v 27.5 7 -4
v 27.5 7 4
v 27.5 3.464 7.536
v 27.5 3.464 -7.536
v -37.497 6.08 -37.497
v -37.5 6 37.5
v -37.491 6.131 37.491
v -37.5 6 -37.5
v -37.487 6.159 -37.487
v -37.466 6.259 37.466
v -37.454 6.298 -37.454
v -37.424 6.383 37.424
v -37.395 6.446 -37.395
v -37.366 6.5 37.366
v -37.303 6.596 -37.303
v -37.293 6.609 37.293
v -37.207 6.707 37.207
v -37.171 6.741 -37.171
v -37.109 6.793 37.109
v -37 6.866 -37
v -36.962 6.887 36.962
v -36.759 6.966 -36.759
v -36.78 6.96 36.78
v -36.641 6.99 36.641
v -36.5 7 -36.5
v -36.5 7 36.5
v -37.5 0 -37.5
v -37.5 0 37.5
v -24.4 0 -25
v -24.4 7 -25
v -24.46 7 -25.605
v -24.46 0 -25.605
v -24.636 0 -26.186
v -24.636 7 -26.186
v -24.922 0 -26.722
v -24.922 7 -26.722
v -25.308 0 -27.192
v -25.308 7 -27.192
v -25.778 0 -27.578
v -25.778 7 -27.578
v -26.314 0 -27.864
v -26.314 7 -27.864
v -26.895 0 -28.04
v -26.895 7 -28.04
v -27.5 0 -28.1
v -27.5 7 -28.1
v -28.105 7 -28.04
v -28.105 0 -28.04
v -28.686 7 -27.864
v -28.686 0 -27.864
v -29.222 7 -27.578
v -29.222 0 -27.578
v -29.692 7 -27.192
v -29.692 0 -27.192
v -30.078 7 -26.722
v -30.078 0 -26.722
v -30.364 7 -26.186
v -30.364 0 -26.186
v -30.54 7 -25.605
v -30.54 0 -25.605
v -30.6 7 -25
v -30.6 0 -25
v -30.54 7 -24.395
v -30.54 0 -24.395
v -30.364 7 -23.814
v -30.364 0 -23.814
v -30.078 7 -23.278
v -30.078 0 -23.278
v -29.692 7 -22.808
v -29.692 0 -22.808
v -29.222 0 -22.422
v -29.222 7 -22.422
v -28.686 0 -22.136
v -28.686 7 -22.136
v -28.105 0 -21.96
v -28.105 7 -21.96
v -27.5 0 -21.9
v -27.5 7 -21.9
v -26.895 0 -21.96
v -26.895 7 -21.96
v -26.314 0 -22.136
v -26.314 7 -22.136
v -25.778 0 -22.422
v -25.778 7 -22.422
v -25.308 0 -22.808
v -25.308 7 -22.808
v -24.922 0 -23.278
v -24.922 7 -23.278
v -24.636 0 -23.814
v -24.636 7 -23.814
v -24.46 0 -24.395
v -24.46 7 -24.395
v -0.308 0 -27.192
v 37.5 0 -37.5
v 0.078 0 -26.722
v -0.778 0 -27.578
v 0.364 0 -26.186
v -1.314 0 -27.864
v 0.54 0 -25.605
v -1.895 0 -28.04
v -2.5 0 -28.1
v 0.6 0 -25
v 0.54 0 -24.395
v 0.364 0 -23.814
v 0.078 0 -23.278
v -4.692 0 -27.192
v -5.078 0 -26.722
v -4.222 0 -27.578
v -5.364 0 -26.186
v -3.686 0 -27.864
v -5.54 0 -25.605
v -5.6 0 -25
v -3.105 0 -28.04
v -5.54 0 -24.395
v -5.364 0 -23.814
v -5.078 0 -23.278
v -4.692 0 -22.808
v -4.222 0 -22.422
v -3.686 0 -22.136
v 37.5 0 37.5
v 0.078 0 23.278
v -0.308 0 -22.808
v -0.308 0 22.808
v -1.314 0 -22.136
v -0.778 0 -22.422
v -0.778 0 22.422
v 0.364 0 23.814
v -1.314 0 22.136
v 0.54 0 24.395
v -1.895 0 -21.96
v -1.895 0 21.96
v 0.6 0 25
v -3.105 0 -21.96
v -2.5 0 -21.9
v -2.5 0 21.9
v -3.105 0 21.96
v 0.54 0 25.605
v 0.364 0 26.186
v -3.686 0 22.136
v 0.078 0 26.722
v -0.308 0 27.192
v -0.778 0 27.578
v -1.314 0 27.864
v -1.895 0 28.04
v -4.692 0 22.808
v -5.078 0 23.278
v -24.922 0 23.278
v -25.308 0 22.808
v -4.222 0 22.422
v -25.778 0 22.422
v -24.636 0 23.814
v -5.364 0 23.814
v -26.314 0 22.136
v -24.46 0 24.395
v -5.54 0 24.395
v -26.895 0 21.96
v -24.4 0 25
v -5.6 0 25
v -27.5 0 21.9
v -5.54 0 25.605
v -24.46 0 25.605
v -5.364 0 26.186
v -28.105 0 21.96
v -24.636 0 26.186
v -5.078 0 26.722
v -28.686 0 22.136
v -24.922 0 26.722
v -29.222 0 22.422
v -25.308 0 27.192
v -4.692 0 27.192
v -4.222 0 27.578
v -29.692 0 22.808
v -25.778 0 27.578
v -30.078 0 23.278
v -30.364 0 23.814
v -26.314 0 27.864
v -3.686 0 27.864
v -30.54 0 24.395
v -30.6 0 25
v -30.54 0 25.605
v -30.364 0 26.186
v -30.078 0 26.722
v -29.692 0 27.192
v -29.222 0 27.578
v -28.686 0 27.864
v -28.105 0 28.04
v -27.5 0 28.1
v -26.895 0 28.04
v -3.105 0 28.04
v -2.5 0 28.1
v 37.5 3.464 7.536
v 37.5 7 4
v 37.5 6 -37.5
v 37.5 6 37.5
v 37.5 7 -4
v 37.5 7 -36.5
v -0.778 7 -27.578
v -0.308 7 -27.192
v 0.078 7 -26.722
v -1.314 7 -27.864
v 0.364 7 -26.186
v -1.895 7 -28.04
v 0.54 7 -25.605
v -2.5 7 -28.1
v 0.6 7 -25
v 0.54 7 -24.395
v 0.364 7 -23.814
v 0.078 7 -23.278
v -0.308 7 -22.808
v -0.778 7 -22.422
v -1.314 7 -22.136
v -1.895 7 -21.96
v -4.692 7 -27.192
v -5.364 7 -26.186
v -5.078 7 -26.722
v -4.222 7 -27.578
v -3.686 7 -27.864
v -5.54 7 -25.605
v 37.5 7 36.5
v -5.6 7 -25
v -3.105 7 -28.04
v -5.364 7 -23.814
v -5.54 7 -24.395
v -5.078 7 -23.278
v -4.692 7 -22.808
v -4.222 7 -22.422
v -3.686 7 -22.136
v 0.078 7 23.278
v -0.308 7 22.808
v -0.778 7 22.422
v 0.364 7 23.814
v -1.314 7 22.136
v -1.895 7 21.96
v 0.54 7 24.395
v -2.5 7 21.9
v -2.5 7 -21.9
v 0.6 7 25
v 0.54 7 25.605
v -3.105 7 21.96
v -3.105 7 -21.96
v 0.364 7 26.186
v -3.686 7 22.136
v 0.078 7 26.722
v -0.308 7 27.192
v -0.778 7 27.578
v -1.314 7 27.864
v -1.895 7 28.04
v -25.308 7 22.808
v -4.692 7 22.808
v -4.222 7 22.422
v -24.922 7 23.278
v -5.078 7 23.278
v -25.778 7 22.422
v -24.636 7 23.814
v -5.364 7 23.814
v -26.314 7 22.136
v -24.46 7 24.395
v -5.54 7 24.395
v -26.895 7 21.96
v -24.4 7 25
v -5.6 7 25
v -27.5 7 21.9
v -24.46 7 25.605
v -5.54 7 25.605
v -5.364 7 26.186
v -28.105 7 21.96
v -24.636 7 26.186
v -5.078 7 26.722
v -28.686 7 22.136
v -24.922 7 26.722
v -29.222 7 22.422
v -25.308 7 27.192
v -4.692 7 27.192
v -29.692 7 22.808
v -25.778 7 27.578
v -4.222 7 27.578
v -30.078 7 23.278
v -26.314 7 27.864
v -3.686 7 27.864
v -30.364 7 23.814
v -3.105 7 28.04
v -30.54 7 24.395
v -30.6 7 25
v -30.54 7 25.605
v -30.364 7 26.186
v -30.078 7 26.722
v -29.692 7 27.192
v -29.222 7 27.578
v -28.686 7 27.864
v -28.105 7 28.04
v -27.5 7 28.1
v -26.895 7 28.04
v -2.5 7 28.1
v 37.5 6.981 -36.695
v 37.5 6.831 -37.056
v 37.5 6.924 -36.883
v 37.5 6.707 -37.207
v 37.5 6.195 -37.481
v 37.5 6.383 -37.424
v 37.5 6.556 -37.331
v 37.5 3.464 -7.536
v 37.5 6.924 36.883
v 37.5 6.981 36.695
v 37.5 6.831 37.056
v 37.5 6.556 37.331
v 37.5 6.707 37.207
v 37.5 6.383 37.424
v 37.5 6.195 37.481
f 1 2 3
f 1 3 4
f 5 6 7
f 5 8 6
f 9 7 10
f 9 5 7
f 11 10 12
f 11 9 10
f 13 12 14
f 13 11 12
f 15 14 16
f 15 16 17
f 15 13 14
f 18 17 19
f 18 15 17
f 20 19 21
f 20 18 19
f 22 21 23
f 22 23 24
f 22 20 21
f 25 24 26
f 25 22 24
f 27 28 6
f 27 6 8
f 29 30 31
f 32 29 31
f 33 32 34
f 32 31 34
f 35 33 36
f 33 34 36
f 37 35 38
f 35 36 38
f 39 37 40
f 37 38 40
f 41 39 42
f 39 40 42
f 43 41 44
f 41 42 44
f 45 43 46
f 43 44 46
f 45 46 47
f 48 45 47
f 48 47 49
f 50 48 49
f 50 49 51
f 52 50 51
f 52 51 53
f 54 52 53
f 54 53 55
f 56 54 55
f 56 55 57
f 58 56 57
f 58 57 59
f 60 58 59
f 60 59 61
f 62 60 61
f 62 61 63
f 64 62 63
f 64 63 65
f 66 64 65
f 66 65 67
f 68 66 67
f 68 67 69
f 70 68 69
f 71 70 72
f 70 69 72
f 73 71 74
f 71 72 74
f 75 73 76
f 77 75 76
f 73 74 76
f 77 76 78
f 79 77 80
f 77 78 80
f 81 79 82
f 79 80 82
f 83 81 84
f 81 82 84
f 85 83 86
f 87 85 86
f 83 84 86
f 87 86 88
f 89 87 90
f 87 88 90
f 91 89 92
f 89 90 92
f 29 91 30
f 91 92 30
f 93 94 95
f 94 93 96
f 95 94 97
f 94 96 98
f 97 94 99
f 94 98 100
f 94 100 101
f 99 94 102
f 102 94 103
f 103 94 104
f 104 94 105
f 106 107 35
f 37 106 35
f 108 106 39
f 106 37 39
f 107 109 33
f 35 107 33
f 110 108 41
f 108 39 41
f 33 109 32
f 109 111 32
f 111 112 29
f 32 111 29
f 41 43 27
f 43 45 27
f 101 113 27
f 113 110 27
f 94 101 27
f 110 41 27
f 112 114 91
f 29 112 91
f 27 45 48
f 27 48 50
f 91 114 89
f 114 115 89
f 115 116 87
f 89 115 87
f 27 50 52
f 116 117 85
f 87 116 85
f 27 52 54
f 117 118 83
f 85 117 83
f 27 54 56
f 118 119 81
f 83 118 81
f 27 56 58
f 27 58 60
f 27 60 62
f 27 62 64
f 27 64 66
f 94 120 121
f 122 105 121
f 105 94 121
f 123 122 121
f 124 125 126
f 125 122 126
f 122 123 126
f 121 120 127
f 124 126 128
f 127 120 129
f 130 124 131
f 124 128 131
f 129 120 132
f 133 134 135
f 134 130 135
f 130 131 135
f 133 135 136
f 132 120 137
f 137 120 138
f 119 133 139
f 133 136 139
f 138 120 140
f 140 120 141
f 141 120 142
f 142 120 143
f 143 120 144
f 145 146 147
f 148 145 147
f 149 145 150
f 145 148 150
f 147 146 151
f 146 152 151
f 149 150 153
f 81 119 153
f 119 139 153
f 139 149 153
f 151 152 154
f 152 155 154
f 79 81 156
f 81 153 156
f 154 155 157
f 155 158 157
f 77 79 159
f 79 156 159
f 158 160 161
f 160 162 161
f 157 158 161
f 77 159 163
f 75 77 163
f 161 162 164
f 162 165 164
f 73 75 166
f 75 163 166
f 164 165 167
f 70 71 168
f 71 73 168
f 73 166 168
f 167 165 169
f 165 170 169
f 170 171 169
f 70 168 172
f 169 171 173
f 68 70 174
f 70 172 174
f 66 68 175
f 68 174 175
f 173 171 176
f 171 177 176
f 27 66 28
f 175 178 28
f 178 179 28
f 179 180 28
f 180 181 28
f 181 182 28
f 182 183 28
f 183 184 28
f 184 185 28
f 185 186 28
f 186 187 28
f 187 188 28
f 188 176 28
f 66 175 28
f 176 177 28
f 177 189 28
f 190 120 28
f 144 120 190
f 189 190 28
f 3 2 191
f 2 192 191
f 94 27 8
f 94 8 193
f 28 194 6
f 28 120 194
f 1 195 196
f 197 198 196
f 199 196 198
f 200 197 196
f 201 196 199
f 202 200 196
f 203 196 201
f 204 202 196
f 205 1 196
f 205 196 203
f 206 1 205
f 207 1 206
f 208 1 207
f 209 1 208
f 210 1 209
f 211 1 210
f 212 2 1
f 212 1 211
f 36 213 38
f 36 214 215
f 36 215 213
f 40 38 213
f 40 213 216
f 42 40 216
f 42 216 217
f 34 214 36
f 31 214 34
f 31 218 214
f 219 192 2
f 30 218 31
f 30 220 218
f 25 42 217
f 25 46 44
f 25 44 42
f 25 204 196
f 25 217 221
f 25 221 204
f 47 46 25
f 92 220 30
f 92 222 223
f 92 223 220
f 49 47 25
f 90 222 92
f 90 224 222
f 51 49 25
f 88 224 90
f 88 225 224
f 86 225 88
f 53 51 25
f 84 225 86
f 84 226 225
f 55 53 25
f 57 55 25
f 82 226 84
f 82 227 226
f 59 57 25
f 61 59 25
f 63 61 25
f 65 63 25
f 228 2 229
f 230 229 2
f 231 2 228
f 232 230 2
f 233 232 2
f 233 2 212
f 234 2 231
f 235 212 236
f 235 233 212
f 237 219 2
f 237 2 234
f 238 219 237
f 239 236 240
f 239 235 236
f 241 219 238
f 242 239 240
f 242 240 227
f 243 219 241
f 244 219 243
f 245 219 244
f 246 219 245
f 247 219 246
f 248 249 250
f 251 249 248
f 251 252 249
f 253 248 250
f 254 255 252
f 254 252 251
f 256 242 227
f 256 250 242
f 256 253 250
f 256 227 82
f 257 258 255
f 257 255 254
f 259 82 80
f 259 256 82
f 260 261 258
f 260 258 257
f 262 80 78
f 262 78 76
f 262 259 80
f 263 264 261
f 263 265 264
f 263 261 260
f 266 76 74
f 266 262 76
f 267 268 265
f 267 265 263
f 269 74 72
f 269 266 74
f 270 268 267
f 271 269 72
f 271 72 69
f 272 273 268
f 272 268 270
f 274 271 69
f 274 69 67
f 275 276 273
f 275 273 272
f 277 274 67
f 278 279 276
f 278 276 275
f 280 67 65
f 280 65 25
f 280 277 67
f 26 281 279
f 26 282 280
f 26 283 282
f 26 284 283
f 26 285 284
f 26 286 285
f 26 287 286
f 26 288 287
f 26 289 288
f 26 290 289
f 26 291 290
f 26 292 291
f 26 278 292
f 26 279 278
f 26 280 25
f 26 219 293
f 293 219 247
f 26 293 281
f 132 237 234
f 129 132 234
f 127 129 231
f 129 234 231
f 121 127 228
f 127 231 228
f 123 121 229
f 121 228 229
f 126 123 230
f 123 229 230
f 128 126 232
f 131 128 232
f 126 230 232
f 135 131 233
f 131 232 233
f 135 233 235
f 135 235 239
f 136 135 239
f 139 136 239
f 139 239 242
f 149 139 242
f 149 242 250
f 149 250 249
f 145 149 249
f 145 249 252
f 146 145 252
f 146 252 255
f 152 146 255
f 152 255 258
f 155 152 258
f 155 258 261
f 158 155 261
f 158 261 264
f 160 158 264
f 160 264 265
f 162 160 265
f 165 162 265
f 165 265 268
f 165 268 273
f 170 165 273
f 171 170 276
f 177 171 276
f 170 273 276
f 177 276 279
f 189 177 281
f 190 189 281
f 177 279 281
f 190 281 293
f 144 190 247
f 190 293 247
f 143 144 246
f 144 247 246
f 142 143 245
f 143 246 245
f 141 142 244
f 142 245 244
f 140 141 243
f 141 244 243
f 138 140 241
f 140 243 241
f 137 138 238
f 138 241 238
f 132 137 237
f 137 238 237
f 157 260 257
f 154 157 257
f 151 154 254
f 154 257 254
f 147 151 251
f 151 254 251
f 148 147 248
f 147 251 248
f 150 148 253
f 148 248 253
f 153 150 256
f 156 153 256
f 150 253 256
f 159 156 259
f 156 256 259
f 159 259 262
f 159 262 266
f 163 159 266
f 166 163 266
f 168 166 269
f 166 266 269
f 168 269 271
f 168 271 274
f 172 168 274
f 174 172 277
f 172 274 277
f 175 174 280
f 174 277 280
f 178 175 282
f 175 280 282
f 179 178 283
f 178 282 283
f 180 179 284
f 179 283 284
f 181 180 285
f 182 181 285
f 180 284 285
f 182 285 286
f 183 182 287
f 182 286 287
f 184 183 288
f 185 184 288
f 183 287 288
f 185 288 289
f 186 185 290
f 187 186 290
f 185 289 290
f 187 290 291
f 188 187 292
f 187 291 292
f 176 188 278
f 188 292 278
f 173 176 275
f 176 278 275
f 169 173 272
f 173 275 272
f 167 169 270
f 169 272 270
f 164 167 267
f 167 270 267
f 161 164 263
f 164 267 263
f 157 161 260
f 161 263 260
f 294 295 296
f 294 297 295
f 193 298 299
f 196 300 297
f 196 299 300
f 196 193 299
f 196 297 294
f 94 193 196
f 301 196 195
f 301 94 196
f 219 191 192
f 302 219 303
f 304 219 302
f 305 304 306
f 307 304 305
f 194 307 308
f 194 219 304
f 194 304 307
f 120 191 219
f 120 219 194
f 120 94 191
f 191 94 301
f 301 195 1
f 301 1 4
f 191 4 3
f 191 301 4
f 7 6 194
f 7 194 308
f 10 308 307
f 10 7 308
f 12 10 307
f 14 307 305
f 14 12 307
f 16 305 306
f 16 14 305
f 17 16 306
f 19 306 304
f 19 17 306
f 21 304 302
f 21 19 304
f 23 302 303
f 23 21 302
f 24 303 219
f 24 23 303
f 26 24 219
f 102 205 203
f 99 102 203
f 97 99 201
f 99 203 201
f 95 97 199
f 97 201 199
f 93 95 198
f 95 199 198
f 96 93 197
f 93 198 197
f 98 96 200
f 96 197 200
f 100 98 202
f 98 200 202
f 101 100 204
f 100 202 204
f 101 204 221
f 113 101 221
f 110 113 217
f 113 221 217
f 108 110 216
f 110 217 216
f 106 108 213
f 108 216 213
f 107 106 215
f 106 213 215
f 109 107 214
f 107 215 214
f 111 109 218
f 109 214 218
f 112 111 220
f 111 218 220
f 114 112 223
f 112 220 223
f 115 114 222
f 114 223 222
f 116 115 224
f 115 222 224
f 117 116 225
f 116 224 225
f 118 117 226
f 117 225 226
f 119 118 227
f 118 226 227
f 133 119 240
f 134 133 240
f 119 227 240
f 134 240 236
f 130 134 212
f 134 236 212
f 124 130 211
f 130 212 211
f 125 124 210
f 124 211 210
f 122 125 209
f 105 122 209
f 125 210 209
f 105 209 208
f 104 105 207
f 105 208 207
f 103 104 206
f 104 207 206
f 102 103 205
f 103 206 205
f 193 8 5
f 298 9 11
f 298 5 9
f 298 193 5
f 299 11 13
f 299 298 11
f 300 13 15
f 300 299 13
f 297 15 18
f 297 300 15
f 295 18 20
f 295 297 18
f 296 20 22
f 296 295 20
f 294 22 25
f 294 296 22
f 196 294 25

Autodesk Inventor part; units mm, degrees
ref_plane "YZ Plane" through (0, 0, 0) normal (1, 0, 0) x (0, 1, 0)
ref_plane "XZ Plane" through (0, 0, 0) normal (0, 1, 0) x (-1, 0, 0)
ref_plane "XY Plane" through (0, 0, 0) normal (0, 0, 1) x (1, 0, 0)
sketch "Sketch1" plane through (0, 0, 0) normal (0, 1, 0) x (-1, 0, 0)
  line L0 (-37.5, 37.5) -> (37.5, 37.5)
  line L1 (37.5, 37.5) -> (37.5, -37.5)
  line L2 (37.5, -37.5) -> (-37.5, -37.5)
  line L3 (-37.5, -37.5) -> (-37.5, 37.5)
  line L4 (-37.5, 37.5) -> (37.5, -37.5) construction
  line L5 (37.5, 37.5) -> (-37.5, -37.5) construction
  point P0 (0, 0)
  dimension "d0" = 75
  dimension "d1" = 75
extrude "Extrusion1" add sketch "Sketch1" along normal blind 7
sketch "Sketch2" plane through (0, 7, 0) normal (0, 1, 0) x (1, 0, 0)
  circle A0 centre (-27.5, -25) radius 3.1
  line L0 (-37.5, -37.5) -> (37.5, -37.5) projected
  line L1 (37.5, -37.5) -> (37.5, 37.5) projected
  circle A1 centre (-2.5, -25) radius 3.1
  point P0 (0, 0)
  dimension "d4" = 6.2
  dimension "d5" = 12.5
  dimension "d6" = 65
  dimension "d19" = 6.2
  dimension "d20" = 12.5
  dimension "d21" = 40
extrude "Extrusion2" cut sketch "Sketch2" against normal through all
mirror "Mirror1" about plane through (0, 0, 0) normal (0, 0, 1) of "Extrusion2"
sketch "Sketch3" plane through (37.5, 0, 37.5) normal (1, 0, 0) x (0, 0, -1)
  line L0 (0, 7) -> (75, 7) projected
  line L1 (33.5, 7) -> (29.9645, 3.4645)
  line L2 (33.5, 7) -> (38.5, 7) construction
  line L3 (33.5, 7) -> (41.5, 7)
  line L4 (33.5, 7) -> (41.5, 7) construction
  line L5 (41.5, 7) -> (45.0355, 3.4645)
  line L6 (45.0355, 3.4645) -> (29.9645, 3.4645)
  point P0 (37.5, 0)
  dimension "d9" = 5
  dimension "d10" = 135
  dimension "d11" = 33.5
  dimension "d12" = 8
  dimension "d13" = 0
  dimension "d14" = 5
  dimension "d15" = 135
extrude "Extrusion3" cut sketch "Sketch3" against normal blind 10
fillet "Fillet1" radius 1 3 edges at (0, 7, -37.5) (-37.5, 7, 0) (0, 7, 37.5)
properties part number "Dovetail_holder_V3"
